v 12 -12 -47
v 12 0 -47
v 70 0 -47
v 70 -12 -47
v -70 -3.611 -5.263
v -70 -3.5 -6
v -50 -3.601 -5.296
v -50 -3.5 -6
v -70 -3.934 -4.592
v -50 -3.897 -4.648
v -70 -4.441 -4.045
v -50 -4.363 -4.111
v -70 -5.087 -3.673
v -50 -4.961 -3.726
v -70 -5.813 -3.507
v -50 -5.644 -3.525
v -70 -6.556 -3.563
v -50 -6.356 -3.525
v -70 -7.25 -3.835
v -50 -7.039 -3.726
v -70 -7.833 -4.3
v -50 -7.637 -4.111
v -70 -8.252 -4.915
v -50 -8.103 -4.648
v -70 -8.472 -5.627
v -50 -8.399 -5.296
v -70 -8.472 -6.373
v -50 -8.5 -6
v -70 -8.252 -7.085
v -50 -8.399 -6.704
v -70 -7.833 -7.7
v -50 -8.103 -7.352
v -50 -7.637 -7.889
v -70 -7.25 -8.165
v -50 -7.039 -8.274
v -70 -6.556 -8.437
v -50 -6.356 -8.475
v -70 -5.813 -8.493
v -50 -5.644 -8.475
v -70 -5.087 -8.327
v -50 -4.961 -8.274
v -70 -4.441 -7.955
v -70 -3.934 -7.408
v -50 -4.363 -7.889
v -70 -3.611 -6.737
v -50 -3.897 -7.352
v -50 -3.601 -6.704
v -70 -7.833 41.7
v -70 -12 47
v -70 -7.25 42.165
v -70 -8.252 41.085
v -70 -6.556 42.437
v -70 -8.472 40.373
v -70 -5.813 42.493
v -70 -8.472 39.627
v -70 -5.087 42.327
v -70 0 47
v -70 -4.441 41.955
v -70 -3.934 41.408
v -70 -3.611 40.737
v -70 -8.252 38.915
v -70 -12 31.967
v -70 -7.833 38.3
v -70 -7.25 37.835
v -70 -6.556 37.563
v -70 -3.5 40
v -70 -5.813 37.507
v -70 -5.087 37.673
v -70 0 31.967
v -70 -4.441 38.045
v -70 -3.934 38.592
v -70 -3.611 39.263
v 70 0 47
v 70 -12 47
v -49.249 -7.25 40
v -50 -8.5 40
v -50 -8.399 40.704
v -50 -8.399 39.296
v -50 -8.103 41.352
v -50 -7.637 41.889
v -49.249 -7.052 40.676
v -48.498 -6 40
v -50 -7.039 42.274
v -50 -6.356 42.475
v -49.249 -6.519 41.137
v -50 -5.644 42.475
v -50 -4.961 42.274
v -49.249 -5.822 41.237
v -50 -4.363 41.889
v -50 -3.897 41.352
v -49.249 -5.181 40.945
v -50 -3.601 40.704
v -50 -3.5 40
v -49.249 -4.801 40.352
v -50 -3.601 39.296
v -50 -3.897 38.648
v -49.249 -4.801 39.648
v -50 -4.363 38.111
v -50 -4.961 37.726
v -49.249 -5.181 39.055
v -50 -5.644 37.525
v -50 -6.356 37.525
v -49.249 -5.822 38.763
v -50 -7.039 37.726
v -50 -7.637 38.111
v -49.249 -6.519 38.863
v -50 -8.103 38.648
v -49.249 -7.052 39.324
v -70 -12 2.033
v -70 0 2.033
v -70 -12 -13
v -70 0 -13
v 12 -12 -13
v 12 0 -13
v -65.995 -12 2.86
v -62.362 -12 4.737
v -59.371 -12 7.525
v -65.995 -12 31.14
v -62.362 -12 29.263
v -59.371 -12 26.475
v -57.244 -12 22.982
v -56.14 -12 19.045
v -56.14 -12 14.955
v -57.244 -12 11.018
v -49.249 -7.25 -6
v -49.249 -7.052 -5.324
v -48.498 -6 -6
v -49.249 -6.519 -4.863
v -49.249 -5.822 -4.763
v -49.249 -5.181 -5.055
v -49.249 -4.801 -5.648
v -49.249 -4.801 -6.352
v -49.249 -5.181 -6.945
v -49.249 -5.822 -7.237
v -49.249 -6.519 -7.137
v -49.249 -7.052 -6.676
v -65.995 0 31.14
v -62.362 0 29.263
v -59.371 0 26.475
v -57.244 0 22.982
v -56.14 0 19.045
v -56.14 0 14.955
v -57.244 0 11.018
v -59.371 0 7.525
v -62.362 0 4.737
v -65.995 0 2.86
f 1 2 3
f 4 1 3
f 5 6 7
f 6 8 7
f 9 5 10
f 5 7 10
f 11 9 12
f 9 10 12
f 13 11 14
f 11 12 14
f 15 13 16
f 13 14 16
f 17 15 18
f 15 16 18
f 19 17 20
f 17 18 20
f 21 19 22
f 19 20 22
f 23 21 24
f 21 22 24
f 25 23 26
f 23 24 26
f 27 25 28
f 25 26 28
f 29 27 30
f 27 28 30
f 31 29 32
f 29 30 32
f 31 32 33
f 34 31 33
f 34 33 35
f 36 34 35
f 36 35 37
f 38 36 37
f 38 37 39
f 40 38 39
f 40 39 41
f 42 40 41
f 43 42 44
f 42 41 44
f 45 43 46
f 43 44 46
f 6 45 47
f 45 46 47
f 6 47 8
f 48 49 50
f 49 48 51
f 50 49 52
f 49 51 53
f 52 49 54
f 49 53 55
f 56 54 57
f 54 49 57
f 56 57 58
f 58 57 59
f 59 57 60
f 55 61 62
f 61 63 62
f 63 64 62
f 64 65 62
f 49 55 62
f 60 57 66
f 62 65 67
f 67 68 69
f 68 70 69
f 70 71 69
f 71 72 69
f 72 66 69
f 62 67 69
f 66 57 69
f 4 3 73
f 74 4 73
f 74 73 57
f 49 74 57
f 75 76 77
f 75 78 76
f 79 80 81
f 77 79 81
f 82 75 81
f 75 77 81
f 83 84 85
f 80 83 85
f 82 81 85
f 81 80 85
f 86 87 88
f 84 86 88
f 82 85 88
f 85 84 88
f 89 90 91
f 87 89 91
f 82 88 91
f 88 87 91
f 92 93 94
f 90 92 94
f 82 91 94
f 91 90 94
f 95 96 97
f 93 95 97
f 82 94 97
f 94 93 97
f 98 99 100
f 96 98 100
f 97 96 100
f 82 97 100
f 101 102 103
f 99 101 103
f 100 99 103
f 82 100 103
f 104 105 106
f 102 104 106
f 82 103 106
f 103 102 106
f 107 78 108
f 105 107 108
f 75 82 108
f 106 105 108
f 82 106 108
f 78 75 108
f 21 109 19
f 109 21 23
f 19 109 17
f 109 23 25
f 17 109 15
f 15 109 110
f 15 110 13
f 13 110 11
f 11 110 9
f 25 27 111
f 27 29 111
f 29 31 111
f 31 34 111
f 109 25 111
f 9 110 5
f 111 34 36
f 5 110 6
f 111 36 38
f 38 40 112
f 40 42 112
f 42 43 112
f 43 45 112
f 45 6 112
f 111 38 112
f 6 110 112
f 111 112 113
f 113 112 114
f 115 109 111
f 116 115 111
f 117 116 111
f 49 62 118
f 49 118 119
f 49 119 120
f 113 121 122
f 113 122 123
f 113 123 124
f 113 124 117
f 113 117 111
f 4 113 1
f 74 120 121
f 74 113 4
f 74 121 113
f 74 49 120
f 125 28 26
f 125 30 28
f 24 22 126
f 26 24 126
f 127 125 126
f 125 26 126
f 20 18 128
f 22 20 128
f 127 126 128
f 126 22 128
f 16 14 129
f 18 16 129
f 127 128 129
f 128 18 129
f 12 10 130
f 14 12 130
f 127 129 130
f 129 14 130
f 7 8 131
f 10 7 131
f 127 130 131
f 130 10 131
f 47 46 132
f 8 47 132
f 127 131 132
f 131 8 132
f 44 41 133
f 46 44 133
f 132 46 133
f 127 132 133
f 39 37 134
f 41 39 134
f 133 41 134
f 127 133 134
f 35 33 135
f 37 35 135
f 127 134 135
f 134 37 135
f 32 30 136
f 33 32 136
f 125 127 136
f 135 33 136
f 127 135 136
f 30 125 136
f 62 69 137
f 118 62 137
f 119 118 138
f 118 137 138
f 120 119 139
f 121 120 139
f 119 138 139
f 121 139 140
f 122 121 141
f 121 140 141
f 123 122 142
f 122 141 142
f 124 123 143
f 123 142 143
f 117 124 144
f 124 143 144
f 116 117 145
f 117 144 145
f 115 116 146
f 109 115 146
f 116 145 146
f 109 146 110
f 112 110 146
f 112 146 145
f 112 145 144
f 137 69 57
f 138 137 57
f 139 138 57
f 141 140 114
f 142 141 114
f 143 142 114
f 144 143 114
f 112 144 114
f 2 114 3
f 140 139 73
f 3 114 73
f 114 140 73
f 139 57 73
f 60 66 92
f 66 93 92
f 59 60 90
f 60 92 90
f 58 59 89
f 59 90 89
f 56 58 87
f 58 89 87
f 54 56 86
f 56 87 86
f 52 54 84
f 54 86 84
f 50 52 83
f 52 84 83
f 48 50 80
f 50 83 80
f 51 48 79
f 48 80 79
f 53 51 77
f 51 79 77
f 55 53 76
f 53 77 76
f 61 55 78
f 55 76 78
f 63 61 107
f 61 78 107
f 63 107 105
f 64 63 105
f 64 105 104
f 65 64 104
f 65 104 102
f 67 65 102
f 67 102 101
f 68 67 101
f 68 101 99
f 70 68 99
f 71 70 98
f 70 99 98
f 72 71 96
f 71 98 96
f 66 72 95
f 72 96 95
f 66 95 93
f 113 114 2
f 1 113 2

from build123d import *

# Parameters (mm, degrees)
F1_DEPTH = 12
F3_D     = 5
F3_DEPTH = 20
F3_TIP   = 1.5021515476


with BuildPart() as f1:
    # F0 (on Front) → F1 (new body)
    with BuildSketch(Plane.XZ):
        with BuildLine():
            Line((12, -47), (70, -47))
            Line((70, -47), (70, 47))
            Line((70, 47), (-70, 47))
            Line((-70, 47), (-70, 31.9666295471))
            ThreePointArc((-70, 31.9666295471), (-56, 17), (-70, 2.0333704529))
            Line((-70, 2.0333704529), (-70, -13))
            Line((-70, -13), (12, -13))
            Line((12, -13), (12, -47))
        make_face()
    extrude(amount=F1_DEPTH)

    # F3
    with Locations(Plane(origin=(-70, 0, 0), x_dir=(0, -1, 0), z_dir=(-1, 0, 0))):
        with Locations((6, 40), (6, -6)):
            Hole(F3_D / 2, depth=F3_DEPTH)
            with Locations((0, 0, -(F3_DEPTH + F3_TIP / 2))):  # 118° drill point
                Cone(0, F3_D / 2, F3_TIP, mode=Mode.SUBTRACT)


solid = f1.part
